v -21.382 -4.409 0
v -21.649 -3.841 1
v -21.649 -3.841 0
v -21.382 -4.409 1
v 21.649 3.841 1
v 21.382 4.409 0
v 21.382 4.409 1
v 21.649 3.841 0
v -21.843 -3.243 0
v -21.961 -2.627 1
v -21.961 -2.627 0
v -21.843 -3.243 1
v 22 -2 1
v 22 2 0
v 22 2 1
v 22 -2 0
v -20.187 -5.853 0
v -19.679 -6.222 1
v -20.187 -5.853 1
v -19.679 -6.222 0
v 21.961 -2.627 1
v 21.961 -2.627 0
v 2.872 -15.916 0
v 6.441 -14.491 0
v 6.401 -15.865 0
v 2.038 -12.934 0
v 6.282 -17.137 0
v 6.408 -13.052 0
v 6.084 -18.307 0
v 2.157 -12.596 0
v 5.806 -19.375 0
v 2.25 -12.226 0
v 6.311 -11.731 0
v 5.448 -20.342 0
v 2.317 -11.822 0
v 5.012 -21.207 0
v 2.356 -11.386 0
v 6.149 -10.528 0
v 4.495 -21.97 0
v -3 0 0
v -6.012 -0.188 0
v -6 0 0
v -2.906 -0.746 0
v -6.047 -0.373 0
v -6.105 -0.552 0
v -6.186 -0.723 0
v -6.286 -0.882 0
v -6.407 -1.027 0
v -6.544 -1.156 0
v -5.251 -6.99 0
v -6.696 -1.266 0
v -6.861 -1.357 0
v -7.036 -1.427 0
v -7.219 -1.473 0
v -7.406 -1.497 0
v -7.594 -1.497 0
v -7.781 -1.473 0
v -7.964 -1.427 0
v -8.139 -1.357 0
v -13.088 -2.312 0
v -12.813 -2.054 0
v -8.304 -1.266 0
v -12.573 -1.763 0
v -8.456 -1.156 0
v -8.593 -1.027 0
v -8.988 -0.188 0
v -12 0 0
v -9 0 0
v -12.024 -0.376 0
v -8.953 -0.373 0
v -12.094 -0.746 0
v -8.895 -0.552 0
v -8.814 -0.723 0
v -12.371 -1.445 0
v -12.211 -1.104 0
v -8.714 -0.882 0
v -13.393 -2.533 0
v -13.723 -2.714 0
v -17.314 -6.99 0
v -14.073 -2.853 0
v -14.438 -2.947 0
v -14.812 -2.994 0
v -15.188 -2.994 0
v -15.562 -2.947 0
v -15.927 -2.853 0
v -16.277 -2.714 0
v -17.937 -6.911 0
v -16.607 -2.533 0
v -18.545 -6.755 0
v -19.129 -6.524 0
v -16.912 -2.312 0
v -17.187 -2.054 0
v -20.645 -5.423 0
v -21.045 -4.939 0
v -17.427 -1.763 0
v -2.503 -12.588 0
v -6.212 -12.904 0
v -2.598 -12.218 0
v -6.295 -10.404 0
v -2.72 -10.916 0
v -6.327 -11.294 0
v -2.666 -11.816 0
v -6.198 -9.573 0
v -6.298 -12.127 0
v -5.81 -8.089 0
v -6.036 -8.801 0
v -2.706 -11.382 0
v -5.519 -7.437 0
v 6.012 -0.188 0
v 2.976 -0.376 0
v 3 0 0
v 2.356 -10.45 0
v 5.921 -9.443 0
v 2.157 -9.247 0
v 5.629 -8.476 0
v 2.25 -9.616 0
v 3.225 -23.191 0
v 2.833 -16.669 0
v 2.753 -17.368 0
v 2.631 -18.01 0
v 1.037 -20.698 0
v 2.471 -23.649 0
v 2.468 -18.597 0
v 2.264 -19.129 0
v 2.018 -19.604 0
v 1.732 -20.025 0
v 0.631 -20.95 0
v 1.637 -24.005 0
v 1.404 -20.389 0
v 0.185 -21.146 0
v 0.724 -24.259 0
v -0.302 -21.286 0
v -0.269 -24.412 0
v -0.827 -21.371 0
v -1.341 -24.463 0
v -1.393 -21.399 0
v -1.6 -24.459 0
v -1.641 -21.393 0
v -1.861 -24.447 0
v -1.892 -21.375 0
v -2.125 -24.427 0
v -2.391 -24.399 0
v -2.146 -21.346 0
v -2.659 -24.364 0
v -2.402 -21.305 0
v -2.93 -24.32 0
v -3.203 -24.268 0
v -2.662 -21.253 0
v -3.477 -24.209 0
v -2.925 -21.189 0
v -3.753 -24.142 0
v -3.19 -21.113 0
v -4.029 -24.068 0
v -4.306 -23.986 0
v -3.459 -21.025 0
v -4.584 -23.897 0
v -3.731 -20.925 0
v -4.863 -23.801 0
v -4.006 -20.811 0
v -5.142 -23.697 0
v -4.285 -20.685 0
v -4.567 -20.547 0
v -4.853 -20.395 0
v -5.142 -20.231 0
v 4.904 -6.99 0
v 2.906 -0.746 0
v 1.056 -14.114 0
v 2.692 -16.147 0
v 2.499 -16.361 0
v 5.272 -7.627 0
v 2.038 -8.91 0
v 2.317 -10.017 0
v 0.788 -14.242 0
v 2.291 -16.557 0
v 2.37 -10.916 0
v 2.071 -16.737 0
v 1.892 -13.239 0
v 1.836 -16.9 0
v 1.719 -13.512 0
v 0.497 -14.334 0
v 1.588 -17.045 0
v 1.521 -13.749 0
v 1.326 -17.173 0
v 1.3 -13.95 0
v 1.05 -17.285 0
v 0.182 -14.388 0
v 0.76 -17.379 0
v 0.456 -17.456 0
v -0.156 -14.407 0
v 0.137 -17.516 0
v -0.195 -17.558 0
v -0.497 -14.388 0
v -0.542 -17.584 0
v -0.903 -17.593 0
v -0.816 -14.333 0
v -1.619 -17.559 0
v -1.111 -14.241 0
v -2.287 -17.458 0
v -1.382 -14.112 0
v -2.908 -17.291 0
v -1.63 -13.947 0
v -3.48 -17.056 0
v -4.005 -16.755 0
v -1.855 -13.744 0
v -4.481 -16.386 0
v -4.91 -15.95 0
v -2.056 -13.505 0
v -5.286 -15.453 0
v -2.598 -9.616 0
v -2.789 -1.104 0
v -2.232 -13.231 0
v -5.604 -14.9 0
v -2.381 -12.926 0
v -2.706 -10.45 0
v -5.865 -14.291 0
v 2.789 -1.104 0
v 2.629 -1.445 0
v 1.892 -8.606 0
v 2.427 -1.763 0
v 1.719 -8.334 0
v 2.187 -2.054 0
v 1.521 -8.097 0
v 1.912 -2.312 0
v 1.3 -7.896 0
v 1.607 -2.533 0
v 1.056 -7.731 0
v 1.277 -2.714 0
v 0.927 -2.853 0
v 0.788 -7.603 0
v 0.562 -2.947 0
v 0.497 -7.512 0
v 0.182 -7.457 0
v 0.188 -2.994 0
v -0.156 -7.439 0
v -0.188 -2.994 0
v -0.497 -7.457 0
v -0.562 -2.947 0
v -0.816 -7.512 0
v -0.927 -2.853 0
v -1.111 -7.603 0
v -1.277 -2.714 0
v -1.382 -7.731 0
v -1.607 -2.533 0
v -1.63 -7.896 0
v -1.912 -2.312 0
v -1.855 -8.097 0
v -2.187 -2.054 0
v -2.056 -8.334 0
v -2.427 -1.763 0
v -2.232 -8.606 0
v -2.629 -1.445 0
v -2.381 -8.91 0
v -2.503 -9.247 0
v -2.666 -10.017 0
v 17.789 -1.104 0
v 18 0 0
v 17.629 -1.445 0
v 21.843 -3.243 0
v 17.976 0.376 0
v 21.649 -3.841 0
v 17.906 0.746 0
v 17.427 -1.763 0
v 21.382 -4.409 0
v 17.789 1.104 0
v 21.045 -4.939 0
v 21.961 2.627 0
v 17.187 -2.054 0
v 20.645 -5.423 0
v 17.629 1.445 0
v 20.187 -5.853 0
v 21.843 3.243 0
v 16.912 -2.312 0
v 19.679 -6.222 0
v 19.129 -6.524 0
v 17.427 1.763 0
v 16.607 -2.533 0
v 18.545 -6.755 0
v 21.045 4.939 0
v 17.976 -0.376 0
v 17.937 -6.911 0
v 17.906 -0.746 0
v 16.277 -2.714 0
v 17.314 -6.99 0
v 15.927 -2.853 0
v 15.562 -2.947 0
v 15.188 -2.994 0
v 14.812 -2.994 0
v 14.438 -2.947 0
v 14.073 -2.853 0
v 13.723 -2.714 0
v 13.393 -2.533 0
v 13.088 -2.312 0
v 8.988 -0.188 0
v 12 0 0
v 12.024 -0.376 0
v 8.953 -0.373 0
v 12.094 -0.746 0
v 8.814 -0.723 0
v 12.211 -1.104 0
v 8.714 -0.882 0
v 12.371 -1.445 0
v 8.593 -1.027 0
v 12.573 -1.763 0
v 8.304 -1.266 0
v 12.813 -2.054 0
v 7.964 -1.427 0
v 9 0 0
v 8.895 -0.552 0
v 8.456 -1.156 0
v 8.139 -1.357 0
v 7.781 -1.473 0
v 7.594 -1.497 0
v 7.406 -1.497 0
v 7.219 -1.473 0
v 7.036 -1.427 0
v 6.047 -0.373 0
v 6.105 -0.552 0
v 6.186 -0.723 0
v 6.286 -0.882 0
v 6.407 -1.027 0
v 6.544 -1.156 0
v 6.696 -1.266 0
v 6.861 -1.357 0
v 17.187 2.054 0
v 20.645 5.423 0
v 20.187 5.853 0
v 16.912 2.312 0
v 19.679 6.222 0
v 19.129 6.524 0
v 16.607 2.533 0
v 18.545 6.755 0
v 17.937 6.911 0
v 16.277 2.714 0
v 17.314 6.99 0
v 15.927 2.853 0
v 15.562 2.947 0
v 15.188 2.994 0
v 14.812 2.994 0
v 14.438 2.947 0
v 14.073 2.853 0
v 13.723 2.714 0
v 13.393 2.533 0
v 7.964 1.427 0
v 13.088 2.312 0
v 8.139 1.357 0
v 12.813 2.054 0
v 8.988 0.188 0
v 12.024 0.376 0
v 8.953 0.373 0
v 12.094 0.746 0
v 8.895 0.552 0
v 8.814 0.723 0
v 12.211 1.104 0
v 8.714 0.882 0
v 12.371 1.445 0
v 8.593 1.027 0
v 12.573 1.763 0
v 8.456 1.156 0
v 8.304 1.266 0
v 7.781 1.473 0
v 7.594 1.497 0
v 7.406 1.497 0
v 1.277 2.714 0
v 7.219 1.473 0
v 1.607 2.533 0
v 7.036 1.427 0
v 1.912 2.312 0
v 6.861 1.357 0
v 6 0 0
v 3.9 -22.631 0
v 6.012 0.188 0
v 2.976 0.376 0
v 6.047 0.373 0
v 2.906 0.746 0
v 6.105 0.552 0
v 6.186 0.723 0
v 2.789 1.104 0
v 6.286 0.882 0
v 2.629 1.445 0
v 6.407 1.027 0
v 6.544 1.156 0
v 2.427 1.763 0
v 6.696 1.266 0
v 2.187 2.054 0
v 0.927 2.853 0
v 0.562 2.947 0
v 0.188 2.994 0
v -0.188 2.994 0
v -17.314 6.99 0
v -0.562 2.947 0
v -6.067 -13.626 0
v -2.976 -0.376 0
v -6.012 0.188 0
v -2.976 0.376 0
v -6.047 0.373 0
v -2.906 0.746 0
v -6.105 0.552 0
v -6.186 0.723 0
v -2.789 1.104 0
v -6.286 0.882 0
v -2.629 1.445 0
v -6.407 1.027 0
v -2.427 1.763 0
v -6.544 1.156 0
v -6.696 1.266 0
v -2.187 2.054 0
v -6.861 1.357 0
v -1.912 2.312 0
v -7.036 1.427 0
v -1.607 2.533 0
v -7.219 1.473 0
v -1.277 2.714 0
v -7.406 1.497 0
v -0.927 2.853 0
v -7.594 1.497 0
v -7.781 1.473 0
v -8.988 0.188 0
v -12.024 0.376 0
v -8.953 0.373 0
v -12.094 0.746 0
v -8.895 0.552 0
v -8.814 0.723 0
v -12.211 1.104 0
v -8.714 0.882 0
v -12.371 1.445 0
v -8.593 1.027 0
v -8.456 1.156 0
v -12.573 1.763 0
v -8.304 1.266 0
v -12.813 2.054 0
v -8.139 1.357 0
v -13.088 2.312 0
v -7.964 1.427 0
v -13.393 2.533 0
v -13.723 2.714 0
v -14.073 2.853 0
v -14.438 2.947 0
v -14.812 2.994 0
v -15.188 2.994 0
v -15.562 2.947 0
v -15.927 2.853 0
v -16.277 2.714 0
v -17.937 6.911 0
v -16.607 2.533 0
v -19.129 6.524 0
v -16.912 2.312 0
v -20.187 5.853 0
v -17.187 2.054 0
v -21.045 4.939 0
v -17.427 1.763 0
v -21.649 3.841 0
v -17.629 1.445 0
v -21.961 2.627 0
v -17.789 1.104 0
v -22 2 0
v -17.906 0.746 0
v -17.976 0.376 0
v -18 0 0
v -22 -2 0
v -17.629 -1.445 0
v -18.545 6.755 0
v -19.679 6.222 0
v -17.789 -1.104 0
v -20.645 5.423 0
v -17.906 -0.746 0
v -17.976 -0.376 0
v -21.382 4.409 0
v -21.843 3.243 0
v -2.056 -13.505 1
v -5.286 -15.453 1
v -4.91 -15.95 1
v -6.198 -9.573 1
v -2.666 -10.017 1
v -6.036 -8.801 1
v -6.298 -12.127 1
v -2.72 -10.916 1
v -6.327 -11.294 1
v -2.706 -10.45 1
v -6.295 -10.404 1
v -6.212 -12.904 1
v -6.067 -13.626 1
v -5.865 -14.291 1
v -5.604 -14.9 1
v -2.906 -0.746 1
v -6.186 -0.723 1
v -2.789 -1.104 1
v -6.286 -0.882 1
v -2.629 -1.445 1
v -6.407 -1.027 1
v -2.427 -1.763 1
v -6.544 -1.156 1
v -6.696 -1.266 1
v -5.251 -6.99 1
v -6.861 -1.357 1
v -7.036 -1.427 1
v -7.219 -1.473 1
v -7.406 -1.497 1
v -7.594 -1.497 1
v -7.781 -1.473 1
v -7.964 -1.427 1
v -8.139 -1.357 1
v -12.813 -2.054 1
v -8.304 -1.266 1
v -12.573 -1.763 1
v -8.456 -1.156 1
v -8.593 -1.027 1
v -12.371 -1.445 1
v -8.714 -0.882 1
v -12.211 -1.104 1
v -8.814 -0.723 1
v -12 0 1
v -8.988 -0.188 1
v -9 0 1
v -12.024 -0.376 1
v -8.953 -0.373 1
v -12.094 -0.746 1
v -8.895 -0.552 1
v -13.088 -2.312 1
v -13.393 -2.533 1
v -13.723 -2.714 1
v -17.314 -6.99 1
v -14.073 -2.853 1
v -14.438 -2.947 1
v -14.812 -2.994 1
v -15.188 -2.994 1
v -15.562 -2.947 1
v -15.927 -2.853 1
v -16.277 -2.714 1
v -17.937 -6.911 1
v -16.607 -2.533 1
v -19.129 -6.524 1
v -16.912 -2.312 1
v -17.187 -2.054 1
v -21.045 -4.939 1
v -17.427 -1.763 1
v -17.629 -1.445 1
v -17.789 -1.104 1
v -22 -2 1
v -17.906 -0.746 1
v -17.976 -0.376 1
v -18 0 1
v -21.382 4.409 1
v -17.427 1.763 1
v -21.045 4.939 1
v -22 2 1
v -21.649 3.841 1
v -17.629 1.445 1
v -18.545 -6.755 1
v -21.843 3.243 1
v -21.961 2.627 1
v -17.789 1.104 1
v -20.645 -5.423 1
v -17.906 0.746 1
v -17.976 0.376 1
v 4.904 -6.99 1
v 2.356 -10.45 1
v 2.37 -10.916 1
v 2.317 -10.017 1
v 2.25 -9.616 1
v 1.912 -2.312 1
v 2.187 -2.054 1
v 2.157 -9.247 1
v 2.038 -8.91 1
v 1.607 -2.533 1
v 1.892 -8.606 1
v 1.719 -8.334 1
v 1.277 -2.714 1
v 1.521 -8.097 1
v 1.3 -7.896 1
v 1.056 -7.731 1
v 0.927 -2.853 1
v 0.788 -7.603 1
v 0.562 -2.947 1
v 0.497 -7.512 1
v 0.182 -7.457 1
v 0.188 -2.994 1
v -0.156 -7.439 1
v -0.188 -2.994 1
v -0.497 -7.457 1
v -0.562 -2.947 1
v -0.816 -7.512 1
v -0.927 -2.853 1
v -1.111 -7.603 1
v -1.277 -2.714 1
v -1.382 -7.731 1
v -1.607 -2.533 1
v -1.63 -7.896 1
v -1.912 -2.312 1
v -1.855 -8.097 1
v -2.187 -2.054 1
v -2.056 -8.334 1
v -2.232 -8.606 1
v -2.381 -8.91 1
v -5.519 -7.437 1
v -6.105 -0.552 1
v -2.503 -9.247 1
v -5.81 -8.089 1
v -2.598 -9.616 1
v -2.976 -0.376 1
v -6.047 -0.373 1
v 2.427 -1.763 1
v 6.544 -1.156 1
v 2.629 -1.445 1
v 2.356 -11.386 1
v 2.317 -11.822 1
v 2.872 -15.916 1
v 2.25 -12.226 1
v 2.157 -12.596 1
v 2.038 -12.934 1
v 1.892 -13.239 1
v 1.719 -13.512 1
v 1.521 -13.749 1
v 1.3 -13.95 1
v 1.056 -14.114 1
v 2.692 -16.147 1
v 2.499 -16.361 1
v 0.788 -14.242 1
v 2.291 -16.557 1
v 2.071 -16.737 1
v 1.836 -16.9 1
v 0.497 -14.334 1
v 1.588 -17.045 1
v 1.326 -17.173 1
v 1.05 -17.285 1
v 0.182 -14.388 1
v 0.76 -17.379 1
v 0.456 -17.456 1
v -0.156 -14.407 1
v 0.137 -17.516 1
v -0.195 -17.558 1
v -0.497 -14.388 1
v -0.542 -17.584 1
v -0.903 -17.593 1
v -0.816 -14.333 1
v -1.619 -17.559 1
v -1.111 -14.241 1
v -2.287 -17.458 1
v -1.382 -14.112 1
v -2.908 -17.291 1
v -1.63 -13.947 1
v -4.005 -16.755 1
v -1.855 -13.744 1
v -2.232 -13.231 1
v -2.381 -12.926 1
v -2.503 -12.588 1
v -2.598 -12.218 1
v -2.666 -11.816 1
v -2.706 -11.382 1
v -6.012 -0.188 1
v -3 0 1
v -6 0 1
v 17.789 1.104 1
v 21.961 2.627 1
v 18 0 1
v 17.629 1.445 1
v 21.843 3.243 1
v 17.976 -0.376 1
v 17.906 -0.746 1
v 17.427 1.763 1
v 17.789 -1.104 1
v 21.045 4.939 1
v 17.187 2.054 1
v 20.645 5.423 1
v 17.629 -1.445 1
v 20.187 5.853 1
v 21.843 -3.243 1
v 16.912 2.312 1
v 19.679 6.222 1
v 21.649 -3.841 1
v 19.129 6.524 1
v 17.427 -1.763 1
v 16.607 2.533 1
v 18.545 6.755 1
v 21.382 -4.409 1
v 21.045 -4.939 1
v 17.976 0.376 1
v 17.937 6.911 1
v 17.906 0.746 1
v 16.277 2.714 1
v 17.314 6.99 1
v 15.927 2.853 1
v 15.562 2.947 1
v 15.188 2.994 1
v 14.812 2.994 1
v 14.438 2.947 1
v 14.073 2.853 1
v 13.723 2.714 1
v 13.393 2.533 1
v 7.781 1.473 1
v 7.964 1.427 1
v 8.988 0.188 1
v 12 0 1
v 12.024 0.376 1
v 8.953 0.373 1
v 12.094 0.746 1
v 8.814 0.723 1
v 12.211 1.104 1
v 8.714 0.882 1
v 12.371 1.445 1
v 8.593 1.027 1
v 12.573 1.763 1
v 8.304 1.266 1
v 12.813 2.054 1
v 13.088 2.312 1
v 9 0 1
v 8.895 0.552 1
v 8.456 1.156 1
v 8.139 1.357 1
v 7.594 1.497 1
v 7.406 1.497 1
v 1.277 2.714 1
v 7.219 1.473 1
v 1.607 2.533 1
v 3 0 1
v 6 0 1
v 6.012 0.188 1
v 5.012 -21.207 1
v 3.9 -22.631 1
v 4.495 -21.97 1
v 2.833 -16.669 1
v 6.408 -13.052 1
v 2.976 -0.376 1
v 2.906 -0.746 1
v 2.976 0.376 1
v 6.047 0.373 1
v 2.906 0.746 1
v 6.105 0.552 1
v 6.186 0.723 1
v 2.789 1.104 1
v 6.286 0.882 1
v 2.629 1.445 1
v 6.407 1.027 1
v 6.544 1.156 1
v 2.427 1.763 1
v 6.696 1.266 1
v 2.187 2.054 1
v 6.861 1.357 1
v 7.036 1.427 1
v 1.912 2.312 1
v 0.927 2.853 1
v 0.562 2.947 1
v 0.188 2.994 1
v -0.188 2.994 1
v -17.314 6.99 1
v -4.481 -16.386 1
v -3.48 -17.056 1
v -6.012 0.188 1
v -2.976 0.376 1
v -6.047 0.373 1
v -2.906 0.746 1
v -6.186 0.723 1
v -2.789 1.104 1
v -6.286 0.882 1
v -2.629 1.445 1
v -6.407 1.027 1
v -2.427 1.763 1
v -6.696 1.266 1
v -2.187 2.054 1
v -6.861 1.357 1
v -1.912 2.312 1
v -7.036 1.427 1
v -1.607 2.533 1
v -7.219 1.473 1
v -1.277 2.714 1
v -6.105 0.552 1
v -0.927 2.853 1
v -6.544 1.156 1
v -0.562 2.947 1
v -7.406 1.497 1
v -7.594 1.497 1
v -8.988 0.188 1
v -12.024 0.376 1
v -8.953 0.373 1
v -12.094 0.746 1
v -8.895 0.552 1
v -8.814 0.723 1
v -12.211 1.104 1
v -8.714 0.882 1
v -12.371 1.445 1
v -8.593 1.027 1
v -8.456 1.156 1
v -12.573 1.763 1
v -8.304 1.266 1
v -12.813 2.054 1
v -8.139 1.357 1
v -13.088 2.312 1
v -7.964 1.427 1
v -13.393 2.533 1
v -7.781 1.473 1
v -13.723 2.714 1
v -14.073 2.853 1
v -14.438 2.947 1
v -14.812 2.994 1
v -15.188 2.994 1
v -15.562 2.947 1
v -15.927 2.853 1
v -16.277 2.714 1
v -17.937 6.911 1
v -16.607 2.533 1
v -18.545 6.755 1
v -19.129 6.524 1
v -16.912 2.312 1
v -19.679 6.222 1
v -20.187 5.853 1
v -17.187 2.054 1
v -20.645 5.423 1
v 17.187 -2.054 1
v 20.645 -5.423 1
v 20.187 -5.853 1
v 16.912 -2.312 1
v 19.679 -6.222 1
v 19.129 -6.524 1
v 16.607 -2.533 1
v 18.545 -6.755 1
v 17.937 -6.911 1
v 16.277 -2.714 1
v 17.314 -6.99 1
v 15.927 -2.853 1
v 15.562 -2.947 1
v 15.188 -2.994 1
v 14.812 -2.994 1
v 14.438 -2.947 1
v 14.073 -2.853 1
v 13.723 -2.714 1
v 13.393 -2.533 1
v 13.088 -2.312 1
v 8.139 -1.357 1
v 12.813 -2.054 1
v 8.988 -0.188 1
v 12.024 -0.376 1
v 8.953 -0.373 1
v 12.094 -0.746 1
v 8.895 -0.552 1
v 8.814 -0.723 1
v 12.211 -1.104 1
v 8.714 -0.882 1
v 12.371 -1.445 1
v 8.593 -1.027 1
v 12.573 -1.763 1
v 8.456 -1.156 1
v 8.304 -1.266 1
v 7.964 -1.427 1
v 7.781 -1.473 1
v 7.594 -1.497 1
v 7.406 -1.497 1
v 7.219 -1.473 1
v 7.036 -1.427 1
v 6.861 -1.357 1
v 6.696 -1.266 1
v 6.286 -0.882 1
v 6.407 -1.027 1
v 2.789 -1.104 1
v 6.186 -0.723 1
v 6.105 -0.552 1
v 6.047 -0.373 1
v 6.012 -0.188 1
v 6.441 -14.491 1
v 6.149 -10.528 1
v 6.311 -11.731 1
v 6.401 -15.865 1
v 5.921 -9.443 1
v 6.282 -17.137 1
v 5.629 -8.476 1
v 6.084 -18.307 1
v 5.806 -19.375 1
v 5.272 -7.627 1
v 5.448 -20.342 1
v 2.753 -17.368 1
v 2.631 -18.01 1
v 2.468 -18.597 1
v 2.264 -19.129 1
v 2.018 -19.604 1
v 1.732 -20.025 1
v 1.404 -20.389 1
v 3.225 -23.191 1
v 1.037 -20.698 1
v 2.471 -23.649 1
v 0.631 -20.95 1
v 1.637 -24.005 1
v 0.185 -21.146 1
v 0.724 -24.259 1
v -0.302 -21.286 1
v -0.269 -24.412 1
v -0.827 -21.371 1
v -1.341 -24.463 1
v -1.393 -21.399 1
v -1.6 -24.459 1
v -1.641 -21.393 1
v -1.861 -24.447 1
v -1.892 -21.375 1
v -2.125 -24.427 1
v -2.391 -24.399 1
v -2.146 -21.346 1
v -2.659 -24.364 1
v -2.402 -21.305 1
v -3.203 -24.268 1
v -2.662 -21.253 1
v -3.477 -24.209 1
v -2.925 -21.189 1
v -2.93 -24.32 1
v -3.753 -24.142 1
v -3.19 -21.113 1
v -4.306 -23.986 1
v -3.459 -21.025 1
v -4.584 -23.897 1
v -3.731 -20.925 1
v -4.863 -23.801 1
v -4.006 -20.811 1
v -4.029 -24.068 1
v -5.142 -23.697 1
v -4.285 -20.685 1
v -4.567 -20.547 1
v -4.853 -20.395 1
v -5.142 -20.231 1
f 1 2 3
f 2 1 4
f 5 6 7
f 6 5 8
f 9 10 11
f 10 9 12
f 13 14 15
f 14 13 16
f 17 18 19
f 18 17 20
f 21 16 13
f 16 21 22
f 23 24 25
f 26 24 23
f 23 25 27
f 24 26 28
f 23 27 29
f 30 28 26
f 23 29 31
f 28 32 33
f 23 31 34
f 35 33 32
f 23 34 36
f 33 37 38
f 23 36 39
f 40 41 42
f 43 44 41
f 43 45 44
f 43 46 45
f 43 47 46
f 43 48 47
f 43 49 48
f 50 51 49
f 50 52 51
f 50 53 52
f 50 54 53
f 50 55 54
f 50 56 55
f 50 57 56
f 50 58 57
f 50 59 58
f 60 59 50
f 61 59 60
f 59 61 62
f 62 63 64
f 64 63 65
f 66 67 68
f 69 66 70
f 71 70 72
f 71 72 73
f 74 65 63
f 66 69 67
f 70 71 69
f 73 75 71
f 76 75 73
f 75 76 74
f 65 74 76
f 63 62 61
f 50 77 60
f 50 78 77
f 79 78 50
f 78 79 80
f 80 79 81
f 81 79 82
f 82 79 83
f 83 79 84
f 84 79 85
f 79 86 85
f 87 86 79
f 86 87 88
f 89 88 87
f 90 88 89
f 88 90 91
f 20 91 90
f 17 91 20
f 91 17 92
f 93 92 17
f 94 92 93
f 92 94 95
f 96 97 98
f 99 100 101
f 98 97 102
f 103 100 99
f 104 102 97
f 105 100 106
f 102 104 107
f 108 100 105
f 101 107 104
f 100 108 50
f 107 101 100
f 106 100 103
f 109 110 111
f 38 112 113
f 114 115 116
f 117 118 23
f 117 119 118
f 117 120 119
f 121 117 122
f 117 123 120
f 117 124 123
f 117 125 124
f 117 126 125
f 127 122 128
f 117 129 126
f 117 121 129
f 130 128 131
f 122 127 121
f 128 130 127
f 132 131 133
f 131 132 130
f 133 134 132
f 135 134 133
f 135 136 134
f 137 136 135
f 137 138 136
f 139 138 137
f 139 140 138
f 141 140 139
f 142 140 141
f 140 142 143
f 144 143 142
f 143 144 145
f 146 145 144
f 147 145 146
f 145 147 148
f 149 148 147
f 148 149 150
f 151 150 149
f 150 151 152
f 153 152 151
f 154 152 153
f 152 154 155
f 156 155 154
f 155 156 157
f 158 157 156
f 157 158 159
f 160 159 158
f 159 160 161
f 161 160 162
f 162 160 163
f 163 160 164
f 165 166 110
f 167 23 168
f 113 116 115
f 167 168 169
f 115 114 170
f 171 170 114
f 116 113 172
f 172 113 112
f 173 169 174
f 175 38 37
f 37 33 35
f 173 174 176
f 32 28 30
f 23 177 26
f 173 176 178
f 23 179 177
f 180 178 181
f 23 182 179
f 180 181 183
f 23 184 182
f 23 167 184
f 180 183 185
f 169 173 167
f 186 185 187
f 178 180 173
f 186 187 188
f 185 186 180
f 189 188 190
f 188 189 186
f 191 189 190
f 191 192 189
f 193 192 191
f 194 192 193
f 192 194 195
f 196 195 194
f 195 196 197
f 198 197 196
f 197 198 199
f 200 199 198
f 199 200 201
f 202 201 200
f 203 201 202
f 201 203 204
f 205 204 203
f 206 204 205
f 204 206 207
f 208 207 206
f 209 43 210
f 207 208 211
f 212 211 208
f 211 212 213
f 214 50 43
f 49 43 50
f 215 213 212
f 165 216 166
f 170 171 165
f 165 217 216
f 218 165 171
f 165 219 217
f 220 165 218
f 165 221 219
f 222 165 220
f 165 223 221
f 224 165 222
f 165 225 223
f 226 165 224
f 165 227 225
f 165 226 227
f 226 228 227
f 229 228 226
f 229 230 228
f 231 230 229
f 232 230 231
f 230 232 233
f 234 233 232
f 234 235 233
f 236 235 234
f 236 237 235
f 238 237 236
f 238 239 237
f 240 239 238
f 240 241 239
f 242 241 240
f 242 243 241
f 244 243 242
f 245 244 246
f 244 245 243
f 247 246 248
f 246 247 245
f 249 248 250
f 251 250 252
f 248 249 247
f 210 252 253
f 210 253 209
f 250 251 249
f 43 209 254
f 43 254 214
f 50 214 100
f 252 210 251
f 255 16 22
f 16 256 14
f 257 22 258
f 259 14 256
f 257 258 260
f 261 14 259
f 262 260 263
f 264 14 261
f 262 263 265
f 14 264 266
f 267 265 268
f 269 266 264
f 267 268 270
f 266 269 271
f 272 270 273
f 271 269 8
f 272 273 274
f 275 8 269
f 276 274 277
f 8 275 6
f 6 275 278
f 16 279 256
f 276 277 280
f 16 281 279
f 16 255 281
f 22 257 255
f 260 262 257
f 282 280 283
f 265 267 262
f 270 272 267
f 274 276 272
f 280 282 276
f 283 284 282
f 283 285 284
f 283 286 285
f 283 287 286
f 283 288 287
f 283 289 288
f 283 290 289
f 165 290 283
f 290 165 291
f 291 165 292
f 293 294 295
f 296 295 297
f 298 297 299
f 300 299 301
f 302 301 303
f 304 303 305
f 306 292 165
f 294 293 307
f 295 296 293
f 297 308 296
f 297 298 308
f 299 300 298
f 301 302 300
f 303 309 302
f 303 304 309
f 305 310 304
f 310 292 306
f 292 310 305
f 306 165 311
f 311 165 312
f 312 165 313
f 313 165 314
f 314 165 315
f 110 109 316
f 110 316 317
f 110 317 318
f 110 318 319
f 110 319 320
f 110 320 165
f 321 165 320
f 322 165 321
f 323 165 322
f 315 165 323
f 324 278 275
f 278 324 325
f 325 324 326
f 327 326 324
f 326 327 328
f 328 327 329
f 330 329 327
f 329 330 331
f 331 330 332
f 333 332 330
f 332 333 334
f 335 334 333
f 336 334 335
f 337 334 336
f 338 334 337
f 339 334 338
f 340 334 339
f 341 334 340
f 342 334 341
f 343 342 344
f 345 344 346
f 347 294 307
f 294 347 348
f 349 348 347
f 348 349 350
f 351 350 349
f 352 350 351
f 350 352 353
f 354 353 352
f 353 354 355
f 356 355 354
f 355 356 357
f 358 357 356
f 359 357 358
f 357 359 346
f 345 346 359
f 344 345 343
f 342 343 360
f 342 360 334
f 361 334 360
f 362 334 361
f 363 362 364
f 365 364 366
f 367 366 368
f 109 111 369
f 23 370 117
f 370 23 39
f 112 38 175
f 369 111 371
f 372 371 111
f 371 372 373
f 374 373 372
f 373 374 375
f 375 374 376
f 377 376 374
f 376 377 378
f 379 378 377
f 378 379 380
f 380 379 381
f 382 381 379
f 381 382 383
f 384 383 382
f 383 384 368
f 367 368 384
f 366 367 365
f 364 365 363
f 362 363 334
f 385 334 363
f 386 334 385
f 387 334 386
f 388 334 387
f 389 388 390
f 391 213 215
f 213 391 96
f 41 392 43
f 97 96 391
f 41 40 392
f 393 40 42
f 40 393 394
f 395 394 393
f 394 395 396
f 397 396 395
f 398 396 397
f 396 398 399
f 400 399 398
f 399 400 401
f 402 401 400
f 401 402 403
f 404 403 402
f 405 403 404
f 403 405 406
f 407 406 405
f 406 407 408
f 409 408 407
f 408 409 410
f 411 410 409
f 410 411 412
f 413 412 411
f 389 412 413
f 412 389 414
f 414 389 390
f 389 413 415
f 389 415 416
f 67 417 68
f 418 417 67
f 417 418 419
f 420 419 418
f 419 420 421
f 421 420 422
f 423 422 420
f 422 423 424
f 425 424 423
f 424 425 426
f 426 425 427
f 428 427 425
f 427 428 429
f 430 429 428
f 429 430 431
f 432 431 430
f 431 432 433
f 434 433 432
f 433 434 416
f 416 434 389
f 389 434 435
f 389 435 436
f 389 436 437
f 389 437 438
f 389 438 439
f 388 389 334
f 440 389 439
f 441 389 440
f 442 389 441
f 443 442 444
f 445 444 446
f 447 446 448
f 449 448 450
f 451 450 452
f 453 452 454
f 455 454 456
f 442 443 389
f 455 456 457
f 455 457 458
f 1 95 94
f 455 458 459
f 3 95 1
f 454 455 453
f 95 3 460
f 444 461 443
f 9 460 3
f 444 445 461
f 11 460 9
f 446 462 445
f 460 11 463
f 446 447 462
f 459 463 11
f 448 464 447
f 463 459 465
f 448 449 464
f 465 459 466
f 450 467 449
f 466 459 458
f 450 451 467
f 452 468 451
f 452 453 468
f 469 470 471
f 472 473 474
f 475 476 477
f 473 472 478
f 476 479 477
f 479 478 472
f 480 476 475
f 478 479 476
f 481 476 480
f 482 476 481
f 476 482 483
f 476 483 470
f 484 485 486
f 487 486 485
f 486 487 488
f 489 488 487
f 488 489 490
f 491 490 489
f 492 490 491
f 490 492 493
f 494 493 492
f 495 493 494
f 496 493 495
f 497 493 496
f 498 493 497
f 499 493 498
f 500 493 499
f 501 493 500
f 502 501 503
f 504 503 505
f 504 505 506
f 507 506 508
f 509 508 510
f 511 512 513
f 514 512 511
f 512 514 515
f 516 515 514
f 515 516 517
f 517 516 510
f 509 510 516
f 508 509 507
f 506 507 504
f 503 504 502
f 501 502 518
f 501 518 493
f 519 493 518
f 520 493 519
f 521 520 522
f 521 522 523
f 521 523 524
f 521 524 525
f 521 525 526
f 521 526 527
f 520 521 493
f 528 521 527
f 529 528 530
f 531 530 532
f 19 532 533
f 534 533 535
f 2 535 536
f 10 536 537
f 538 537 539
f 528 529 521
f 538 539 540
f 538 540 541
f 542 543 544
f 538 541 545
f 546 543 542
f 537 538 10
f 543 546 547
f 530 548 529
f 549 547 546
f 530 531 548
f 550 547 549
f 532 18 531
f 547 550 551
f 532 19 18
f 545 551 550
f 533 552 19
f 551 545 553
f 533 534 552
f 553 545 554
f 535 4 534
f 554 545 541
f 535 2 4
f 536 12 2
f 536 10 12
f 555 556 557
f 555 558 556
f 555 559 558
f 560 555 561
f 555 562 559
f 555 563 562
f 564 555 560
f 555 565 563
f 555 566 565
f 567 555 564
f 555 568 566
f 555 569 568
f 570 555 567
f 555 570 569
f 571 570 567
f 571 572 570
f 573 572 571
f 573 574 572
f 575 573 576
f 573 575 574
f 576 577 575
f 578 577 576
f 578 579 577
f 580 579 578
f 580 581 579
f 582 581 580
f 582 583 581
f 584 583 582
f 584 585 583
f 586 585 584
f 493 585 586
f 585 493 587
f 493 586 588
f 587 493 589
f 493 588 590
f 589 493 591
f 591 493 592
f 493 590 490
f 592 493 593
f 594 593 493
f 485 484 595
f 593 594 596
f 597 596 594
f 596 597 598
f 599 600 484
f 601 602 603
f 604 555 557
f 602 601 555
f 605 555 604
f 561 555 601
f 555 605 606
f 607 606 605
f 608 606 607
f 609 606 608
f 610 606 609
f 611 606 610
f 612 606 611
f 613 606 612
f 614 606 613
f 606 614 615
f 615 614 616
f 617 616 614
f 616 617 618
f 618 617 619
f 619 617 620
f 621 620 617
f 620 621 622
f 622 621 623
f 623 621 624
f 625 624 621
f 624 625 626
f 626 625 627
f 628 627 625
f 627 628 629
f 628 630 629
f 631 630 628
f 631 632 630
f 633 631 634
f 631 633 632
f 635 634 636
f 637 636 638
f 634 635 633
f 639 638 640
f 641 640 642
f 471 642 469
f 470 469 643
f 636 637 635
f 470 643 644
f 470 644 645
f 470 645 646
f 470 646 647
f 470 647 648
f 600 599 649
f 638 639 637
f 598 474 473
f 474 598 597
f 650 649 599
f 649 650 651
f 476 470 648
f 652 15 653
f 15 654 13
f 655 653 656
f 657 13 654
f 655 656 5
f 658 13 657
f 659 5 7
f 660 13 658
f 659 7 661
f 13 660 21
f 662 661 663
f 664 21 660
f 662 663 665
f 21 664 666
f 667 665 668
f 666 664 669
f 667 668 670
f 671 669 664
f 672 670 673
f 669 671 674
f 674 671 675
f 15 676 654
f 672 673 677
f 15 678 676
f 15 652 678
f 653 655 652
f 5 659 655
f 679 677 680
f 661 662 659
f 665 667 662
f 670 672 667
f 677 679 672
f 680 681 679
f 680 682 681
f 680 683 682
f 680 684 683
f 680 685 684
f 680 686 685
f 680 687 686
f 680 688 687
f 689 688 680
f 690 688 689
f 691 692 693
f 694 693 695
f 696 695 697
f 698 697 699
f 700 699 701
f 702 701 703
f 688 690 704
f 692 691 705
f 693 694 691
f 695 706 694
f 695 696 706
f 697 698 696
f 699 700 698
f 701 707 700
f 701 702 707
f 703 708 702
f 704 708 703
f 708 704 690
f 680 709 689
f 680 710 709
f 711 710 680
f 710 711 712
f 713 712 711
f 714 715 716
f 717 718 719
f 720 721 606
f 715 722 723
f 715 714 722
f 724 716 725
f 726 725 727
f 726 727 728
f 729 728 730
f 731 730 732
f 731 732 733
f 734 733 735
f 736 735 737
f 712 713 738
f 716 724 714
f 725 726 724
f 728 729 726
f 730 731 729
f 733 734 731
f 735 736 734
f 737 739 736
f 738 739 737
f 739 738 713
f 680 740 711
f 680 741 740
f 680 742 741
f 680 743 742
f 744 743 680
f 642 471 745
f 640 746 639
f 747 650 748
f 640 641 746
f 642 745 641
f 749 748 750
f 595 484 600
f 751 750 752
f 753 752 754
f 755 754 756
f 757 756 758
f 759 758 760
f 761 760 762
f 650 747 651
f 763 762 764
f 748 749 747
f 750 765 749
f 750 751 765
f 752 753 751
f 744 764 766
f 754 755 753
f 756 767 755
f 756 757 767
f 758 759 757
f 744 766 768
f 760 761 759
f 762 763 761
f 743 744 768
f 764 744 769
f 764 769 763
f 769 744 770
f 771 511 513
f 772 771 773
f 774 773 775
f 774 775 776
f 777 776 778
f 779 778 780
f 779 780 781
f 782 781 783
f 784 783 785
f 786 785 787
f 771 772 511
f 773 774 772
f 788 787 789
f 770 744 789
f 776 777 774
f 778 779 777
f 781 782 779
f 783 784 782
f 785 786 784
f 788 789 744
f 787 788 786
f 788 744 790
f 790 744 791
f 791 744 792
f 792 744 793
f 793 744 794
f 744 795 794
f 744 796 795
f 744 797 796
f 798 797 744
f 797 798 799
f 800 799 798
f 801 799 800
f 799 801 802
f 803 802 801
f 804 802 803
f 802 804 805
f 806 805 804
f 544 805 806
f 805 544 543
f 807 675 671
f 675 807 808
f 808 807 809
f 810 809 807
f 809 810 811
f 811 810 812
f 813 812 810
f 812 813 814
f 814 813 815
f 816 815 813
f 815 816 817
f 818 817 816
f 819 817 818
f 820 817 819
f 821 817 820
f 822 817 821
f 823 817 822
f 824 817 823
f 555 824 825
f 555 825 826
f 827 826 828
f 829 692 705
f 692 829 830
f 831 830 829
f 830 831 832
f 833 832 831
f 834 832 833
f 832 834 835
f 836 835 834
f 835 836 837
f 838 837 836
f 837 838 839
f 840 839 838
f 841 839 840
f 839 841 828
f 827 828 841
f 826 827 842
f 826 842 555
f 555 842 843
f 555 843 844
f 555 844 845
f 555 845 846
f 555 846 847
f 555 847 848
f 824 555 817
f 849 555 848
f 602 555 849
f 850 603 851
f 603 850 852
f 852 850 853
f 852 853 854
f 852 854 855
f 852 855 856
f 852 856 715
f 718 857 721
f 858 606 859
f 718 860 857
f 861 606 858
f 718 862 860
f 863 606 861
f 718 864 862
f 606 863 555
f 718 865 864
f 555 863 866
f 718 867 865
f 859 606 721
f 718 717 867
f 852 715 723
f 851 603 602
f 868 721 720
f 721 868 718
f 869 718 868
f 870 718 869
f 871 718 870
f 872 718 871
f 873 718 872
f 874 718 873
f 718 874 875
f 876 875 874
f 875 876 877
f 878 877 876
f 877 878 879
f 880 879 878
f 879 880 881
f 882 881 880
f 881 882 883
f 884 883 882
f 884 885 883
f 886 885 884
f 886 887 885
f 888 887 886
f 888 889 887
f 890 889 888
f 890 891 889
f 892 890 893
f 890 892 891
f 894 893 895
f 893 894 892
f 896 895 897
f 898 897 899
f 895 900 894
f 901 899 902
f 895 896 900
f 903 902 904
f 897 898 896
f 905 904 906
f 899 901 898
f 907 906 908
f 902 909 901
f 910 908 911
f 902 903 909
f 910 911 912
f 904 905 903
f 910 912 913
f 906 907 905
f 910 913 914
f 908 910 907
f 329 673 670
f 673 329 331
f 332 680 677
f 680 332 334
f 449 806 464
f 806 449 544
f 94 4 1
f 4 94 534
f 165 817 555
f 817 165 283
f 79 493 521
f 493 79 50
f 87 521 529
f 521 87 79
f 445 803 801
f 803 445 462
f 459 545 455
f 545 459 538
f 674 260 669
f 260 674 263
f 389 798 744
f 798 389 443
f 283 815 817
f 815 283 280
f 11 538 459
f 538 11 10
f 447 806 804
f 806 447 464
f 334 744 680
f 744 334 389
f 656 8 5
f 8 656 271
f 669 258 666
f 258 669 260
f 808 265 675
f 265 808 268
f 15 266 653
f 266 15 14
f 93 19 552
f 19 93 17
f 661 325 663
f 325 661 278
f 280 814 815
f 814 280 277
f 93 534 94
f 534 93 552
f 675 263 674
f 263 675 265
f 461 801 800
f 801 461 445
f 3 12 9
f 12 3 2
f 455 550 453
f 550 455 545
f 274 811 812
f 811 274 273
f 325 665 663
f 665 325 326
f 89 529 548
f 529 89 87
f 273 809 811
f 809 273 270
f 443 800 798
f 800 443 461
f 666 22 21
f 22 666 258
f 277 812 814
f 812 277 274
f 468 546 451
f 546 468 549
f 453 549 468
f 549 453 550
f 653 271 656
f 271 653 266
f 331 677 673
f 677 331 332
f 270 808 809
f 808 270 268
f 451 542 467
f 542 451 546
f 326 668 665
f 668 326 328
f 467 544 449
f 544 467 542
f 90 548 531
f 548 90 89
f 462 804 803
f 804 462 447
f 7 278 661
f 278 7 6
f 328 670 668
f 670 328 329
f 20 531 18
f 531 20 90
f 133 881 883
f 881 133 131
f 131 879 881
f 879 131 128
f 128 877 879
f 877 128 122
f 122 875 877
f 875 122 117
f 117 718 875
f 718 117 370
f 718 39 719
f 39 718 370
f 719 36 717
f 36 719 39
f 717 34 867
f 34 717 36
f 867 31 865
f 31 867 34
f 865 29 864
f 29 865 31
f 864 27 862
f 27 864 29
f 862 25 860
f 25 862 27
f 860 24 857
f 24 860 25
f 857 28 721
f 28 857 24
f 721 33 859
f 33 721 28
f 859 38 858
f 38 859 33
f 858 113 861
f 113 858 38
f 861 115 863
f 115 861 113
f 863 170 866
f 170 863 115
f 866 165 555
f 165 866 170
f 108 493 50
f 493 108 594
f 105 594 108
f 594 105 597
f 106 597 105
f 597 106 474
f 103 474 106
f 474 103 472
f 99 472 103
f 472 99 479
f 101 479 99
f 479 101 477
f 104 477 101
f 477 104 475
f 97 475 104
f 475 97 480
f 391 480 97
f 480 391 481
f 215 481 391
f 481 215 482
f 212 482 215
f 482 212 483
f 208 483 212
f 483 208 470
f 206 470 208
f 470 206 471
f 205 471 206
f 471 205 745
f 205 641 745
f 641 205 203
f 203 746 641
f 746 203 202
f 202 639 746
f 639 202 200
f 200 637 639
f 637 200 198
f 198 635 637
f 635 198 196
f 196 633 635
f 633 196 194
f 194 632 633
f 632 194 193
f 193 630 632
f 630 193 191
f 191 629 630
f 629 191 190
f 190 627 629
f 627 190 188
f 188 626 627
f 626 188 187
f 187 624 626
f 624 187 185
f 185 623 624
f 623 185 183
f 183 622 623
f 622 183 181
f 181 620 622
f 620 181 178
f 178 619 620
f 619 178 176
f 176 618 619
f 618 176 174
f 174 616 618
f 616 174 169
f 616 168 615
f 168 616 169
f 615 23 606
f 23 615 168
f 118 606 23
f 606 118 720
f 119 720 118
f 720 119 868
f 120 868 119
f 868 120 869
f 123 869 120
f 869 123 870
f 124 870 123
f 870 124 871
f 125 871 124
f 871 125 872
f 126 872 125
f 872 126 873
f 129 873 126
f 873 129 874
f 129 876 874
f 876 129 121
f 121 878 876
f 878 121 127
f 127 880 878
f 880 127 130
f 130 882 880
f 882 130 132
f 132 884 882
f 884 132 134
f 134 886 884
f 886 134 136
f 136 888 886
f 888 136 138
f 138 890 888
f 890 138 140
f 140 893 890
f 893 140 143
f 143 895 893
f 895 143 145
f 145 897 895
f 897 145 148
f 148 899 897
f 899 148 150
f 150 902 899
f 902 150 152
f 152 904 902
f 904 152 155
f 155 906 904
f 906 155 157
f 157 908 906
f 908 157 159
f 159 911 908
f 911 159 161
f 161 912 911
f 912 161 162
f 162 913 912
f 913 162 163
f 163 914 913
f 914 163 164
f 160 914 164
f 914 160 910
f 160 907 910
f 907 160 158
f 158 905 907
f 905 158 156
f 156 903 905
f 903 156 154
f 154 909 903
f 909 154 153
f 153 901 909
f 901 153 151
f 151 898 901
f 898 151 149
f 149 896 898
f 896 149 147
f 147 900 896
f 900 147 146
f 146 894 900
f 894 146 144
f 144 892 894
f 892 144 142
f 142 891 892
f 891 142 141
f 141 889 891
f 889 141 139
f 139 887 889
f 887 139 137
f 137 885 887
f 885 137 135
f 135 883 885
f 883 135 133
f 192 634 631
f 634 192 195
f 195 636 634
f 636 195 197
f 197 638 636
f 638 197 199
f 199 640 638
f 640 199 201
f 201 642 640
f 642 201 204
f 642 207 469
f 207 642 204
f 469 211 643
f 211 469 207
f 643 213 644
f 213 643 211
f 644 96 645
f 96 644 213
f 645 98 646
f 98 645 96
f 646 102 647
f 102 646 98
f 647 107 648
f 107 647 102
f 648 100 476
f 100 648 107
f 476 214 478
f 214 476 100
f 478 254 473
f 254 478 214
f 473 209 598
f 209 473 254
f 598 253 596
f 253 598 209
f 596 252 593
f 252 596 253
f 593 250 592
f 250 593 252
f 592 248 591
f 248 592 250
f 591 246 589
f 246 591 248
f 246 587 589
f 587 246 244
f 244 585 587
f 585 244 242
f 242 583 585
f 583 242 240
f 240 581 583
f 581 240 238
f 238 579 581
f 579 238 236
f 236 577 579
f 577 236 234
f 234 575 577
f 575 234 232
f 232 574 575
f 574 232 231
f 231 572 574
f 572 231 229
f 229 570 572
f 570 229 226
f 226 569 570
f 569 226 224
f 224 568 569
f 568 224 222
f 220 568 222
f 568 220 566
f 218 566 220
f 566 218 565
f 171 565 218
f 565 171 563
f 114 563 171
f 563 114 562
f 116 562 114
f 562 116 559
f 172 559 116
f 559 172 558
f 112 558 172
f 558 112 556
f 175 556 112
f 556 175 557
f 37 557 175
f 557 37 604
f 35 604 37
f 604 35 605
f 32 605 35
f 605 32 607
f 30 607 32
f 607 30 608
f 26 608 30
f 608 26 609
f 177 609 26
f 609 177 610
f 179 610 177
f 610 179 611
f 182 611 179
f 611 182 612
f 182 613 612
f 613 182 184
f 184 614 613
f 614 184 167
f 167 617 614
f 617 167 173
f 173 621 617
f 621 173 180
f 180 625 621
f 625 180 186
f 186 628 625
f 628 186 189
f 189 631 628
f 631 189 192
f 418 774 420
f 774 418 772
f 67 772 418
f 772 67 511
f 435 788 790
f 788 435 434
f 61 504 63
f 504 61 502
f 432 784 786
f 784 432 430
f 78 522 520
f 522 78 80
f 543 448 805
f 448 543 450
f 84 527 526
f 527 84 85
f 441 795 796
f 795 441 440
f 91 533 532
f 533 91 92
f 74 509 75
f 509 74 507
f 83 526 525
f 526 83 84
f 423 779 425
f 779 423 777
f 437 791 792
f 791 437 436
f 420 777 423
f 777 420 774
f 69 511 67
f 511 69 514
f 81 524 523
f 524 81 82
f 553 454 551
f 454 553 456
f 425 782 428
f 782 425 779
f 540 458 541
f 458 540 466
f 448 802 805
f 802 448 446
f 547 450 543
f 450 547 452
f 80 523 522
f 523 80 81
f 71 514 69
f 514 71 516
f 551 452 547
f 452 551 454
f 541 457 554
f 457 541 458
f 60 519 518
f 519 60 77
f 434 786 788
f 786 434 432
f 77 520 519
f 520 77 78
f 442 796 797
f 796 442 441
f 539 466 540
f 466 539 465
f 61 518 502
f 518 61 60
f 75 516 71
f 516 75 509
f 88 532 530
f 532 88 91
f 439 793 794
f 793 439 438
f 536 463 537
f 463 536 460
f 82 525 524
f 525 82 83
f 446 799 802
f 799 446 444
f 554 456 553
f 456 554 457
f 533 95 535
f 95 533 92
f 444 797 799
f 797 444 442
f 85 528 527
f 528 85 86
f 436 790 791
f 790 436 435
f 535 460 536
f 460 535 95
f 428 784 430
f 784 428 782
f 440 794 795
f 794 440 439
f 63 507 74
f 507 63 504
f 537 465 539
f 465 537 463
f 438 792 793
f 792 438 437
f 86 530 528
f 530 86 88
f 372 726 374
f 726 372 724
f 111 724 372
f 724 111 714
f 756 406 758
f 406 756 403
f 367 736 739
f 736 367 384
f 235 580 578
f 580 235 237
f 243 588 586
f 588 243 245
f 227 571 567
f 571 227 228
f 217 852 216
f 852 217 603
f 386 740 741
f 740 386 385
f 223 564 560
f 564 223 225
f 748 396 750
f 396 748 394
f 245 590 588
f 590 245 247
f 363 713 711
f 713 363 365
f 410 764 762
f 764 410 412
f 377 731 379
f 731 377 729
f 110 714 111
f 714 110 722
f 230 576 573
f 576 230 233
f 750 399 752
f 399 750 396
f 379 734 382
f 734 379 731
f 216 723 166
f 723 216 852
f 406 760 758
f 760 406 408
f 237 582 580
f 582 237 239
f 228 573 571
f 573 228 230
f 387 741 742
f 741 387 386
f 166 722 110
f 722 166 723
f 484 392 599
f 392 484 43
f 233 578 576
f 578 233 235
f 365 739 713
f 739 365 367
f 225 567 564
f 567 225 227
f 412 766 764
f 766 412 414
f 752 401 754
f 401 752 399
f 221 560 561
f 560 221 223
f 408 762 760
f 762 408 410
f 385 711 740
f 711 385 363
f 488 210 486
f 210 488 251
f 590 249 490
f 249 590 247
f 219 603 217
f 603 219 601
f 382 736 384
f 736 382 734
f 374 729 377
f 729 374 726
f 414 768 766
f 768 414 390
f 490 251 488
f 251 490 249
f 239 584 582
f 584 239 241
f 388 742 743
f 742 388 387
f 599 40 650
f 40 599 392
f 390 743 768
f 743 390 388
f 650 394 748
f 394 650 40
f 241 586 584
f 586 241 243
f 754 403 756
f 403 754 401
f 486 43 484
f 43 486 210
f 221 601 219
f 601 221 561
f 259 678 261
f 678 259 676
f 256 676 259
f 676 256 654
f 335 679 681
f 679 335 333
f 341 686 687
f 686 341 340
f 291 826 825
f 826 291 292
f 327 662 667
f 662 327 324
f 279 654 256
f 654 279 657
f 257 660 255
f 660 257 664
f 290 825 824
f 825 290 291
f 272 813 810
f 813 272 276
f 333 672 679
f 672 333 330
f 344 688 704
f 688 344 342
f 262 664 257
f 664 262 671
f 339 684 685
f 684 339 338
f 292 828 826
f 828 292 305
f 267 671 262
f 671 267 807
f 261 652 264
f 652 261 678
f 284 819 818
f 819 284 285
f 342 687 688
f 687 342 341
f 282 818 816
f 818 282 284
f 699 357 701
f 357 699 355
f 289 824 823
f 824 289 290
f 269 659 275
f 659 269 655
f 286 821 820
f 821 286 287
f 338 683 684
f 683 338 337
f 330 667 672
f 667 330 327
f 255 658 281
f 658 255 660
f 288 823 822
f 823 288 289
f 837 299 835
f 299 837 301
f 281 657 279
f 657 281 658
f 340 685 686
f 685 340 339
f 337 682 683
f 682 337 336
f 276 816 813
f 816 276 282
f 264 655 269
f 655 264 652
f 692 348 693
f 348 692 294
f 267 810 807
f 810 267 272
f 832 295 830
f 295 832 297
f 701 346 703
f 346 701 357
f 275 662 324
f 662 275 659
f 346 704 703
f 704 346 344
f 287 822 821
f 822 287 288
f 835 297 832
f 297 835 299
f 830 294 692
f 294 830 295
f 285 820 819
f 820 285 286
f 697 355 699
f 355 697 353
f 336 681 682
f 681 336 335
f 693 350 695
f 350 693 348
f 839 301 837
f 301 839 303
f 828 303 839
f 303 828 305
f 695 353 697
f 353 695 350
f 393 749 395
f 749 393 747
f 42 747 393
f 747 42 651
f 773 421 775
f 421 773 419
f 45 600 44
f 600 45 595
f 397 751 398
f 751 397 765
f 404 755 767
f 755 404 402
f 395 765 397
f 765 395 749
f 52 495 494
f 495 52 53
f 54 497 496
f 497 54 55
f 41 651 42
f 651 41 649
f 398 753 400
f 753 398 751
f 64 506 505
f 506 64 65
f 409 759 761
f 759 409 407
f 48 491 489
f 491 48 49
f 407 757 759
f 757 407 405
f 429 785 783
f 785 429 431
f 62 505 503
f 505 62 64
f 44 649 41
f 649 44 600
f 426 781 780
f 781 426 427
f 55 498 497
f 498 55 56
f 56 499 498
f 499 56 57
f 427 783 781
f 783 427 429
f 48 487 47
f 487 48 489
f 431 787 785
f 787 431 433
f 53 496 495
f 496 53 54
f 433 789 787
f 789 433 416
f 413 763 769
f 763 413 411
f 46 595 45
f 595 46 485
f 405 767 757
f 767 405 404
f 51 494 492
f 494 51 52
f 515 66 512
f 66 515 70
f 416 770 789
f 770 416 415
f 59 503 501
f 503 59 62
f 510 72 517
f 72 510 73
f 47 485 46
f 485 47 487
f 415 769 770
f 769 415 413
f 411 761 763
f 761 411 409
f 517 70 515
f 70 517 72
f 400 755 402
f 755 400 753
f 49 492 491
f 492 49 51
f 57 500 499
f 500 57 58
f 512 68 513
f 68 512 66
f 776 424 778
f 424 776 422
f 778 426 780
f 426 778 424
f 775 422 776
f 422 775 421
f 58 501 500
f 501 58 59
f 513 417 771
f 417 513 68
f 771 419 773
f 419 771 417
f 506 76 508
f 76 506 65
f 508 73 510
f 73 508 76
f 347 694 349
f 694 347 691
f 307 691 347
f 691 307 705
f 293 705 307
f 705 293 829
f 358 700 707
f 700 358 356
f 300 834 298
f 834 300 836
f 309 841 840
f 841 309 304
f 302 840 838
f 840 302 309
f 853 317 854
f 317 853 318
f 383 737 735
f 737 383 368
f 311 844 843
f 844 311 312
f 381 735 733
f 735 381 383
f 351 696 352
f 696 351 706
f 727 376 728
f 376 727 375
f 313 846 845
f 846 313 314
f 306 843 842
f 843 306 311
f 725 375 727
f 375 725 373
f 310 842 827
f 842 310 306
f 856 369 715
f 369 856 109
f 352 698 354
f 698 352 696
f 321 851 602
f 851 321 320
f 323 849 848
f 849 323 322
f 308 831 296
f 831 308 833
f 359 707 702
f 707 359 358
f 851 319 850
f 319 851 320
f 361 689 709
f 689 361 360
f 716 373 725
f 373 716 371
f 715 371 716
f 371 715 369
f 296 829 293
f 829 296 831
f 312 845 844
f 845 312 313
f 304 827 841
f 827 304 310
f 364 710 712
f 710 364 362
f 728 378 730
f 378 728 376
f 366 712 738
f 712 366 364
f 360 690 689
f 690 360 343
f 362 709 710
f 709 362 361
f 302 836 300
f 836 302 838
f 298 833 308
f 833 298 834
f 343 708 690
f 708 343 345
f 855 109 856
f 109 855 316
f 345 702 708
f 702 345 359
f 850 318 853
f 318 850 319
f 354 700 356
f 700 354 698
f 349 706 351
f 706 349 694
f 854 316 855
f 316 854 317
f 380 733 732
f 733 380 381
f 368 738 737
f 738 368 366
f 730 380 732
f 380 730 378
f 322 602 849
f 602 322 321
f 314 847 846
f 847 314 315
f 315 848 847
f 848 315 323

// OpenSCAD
$fn = 50;


difference() {
	union() {
		hull() {
			translate(v = [-17.0000000000, 2.0000000000, 0]) {
				cylinder(h = 1, r = 5);
			}
			translate(v = [17.0000000000, 2.0000000000, 0]) {
				cylinder(h = 1, r = 5);
			}
			translate(v = [-17.0000000000, -2.0000000000, 0]) {
				cylinder(h = 1, r = 5);
			}
			translate(v = [17.0000000000, -2.0000000000, 0]) {
				cylinder(h = 1, r = 5);
			}
		}
		translate(v = [0, -5, 0]) {
			linear_extrude(height = 1) {
				text(font = "DejaVu Sans Mono:style=Bold", halign = "center", size = 19.0000000000, text = "9", valign = "top");
			}
		}
	}
	union() {
		translate(v = [-15.0000000000, 0.0000000000, 0]) {
			translate(v = [0, 0, -100]) {
				cylinder(h = 200, r = 3.0000000000);
			}
		}
		translate(v = [0, 0, -100]) {
			cylinder(h = 200, r = 3.0000000000);
		}
		translate(v = [15.0000000000, 0.0000000000, 0]) {
			translate(v = [0, 0, -100]) {
				cylinder(h = 200, r = 3.0000000000);
			}
		}
		translate(v = [-15.0000000000, 0.0000000000, 0]) {
			translate(v = [0, 0, -100]) {
				cylinder(h = 200, r = 1.5000000000);
			}
		}
		translate(v = [-7.5000000000, 0.0000000000, 0]) {
			translate(v = [0, 0, -100]) {
				cylinder(h = 200, r = 1.5000000000);
			}
		}
		translate(v = [0, 0, -100]) {
			cylinder(h = 200, r = 1.5000000000);
		}
		translate(v = [7.5000000000, 0.0000000000, 0]) {
			translate(v = [0, 0, -100]) {
				cylinder(h = 200, r = 1.5000000000);
			}
		}
		translate(v = [15.0000000000, 0.0000000000, 0]) {
			translate(v = [0, 0, -100]) {
				cylinder(h = 200, r = 1.5000000000);
			}
		}
	}
}
